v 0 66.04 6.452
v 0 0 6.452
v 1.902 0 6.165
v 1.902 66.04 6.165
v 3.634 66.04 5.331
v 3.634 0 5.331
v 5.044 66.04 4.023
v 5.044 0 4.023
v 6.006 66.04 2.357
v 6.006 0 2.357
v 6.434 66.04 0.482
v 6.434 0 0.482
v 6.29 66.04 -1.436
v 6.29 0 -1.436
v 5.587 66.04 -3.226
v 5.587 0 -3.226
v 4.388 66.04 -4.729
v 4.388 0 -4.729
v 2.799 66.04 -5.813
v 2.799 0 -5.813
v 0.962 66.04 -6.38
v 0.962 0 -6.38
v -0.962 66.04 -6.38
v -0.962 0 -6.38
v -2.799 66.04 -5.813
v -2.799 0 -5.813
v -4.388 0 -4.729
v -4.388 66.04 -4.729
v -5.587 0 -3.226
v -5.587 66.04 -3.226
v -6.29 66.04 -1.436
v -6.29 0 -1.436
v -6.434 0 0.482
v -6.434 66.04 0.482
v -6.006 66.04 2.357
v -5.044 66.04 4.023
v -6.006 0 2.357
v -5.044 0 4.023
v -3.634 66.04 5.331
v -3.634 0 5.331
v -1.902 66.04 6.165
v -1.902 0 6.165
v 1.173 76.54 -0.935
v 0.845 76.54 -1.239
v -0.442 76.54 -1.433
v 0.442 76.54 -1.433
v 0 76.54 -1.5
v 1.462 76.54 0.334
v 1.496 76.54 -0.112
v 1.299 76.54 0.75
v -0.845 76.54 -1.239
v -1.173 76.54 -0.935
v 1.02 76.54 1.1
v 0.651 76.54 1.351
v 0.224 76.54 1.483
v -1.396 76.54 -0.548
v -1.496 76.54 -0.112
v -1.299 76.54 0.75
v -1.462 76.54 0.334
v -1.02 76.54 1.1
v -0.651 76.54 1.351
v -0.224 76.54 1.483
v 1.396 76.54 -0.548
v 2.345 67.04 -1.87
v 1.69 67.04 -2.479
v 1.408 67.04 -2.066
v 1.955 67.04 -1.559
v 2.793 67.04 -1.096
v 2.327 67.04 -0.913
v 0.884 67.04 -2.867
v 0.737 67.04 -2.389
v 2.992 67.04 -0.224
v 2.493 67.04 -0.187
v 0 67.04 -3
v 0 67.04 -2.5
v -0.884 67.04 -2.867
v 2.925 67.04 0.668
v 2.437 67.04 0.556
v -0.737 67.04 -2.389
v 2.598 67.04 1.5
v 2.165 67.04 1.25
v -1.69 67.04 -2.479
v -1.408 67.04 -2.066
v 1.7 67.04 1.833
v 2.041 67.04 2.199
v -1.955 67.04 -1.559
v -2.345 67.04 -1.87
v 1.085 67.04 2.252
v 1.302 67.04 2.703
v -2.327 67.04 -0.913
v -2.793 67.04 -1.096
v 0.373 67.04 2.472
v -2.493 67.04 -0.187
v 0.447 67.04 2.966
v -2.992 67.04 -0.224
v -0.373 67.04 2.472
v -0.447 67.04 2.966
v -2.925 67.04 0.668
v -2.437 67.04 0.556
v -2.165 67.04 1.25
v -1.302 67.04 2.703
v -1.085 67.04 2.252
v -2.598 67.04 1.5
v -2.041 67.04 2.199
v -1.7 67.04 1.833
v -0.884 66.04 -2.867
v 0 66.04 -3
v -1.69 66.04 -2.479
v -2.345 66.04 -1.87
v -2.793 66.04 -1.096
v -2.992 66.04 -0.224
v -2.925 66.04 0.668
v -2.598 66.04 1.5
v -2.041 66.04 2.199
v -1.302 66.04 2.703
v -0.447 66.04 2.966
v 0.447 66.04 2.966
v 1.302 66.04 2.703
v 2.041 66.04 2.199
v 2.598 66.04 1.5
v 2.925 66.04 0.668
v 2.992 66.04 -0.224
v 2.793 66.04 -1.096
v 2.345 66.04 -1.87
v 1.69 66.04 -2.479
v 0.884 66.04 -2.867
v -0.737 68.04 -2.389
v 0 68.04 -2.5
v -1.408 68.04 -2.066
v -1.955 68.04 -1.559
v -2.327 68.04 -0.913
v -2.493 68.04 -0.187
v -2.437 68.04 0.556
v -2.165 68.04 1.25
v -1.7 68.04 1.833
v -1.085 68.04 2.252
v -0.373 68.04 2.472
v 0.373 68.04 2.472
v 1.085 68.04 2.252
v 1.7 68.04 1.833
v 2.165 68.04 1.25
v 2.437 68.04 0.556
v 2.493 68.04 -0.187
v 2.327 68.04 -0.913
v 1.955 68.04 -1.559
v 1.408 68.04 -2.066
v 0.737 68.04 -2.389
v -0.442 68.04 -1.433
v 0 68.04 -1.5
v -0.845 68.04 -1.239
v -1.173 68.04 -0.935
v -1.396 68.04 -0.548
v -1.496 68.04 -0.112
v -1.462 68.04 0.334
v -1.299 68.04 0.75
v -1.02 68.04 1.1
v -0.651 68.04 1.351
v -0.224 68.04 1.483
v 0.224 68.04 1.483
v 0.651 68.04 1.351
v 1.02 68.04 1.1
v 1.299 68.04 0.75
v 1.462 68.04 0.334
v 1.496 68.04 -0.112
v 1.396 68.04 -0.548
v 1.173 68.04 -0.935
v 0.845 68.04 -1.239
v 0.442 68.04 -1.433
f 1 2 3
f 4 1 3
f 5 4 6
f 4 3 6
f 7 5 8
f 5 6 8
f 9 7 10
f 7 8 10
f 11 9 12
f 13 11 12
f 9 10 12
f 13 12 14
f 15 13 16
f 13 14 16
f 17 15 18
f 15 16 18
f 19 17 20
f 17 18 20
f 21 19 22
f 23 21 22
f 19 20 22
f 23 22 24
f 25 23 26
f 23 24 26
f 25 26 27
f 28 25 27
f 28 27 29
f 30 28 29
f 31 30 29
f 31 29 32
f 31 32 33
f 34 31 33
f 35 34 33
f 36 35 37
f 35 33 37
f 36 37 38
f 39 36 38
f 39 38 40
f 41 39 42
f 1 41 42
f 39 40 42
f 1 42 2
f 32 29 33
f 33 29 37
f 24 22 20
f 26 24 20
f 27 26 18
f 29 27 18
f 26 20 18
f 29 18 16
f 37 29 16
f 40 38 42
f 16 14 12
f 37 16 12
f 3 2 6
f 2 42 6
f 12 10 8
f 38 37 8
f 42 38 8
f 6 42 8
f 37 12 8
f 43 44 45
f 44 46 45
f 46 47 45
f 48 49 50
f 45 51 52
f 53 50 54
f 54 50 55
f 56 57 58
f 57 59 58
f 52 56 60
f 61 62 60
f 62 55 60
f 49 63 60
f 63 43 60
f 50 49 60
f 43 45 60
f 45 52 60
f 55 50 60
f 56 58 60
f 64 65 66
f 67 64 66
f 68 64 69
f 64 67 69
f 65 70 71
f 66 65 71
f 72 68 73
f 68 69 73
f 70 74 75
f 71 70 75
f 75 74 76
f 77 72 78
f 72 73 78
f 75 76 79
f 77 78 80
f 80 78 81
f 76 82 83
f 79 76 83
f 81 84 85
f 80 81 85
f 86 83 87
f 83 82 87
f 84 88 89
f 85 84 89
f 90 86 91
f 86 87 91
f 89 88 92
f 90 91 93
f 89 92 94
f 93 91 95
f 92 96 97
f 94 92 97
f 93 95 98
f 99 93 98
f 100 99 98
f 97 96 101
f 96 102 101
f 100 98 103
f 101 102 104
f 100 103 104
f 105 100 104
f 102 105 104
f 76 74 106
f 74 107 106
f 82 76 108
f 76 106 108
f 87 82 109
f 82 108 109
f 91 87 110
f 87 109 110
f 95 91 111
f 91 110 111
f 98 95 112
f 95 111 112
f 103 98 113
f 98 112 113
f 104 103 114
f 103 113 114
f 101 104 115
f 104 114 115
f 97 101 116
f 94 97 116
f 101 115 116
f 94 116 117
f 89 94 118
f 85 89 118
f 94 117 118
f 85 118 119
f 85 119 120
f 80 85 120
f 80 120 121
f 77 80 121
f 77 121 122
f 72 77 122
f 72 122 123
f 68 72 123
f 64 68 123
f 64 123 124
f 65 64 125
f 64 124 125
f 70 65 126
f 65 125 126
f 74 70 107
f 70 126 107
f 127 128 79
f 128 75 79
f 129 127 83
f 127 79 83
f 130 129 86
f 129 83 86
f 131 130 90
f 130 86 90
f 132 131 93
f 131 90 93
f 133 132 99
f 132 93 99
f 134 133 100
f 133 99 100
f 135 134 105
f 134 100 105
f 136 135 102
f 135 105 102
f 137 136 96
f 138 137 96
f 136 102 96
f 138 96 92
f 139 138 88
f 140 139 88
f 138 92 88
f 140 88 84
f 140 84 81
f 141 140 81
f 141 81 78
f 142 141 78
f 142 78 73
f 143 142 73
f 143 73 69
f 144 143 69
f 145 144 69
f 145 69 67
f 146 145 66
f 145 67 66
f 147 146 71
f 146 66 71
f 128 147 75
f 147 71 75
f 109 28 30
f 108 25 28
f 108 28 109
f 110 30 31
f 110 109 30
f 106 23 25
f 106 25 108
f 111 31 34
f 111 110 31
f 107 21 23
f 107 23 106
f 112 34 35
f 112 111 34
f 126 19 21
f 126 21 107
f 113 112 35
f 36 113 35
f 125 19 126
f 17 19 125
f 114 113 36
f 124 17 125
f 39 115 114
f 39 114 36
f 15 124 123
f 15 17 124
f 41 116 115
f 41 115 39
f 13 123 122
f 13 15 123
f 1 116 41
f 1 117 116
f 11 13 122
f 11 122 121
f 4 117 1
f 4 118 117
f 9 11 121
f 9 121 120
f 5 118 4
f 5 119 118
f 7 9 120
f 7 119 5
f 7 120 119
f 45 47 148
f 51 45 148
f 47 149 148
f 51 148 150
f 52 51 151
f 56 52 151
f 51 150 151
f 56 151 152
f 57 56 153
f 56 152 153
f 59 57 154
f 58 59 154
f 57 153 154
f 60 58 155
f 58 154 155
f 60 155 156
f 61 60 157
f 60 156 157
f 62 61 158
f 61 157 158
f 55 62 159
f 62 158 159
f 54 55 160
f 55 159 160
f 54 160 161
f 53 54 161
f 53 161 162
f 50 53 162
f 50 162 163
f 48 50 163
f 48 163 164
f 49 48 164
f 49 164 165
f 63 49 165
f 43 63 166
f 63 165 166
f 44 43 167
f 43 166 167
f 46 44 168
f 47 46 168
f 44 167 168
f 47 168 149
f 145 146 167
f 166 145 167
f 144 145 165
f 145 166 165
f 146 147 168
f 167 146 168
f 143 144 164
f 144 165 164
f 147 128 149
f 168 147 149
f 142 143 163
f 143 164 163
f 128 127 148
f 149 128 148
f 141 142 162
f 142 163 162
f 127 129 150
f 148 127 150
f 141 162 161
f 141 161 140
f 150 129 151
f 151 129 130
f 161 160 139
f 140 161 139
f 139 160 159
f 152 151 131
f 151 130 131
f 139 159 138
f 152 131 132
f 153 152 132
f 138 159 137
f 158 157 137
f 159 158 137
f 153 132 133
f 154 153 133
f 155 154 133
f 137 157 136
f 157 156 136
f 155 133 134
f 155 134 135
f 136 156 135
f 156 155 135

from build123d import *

# Parameters (mm, degrees)
SKETCH1_R           = 6.4516
BOSS_EXTRUDE1_DEPTH = 66.04


with BuildPart() as part:
    # Sketch1 → Boss-Extrude1 (new body)
    with BuildSketch(Plane(origin=(0, 0, 0), x_dir=(1, 0, 0), z_dir=(0, 1, 0))):
        with Locations(Location((0, 0, 0), (0, 0, 270))):
            Circle(SKETCH1_R)
    extrude(amount=BOSS_EXTRUDE1_DEPTH)

    # Sketch2 → Revolve1 (revolve)
    with BuildSketch(Plane(origin=(0, 0, 0), x_dir=(0, 0, -1), z_dir=(1, 0, 0)), mode=Mode.PRIVATE) as revolve1_sk:
        Polygon((0, 66.04), (0, 76.54), (-1.5, 76.54), (-1.5, 68.04), (-2.5, 68.04), (-2.5, 67.04), (-3, 67.04), (-3, 66.04), align=None)
    revolve(revolve1_sk.sketch.rotate(Axis((0, 66.04, 0), (0, 1, 0)), 180), axis=Axis((0, 66.04, 0), (0, 1, 0)))


solid = part.part
